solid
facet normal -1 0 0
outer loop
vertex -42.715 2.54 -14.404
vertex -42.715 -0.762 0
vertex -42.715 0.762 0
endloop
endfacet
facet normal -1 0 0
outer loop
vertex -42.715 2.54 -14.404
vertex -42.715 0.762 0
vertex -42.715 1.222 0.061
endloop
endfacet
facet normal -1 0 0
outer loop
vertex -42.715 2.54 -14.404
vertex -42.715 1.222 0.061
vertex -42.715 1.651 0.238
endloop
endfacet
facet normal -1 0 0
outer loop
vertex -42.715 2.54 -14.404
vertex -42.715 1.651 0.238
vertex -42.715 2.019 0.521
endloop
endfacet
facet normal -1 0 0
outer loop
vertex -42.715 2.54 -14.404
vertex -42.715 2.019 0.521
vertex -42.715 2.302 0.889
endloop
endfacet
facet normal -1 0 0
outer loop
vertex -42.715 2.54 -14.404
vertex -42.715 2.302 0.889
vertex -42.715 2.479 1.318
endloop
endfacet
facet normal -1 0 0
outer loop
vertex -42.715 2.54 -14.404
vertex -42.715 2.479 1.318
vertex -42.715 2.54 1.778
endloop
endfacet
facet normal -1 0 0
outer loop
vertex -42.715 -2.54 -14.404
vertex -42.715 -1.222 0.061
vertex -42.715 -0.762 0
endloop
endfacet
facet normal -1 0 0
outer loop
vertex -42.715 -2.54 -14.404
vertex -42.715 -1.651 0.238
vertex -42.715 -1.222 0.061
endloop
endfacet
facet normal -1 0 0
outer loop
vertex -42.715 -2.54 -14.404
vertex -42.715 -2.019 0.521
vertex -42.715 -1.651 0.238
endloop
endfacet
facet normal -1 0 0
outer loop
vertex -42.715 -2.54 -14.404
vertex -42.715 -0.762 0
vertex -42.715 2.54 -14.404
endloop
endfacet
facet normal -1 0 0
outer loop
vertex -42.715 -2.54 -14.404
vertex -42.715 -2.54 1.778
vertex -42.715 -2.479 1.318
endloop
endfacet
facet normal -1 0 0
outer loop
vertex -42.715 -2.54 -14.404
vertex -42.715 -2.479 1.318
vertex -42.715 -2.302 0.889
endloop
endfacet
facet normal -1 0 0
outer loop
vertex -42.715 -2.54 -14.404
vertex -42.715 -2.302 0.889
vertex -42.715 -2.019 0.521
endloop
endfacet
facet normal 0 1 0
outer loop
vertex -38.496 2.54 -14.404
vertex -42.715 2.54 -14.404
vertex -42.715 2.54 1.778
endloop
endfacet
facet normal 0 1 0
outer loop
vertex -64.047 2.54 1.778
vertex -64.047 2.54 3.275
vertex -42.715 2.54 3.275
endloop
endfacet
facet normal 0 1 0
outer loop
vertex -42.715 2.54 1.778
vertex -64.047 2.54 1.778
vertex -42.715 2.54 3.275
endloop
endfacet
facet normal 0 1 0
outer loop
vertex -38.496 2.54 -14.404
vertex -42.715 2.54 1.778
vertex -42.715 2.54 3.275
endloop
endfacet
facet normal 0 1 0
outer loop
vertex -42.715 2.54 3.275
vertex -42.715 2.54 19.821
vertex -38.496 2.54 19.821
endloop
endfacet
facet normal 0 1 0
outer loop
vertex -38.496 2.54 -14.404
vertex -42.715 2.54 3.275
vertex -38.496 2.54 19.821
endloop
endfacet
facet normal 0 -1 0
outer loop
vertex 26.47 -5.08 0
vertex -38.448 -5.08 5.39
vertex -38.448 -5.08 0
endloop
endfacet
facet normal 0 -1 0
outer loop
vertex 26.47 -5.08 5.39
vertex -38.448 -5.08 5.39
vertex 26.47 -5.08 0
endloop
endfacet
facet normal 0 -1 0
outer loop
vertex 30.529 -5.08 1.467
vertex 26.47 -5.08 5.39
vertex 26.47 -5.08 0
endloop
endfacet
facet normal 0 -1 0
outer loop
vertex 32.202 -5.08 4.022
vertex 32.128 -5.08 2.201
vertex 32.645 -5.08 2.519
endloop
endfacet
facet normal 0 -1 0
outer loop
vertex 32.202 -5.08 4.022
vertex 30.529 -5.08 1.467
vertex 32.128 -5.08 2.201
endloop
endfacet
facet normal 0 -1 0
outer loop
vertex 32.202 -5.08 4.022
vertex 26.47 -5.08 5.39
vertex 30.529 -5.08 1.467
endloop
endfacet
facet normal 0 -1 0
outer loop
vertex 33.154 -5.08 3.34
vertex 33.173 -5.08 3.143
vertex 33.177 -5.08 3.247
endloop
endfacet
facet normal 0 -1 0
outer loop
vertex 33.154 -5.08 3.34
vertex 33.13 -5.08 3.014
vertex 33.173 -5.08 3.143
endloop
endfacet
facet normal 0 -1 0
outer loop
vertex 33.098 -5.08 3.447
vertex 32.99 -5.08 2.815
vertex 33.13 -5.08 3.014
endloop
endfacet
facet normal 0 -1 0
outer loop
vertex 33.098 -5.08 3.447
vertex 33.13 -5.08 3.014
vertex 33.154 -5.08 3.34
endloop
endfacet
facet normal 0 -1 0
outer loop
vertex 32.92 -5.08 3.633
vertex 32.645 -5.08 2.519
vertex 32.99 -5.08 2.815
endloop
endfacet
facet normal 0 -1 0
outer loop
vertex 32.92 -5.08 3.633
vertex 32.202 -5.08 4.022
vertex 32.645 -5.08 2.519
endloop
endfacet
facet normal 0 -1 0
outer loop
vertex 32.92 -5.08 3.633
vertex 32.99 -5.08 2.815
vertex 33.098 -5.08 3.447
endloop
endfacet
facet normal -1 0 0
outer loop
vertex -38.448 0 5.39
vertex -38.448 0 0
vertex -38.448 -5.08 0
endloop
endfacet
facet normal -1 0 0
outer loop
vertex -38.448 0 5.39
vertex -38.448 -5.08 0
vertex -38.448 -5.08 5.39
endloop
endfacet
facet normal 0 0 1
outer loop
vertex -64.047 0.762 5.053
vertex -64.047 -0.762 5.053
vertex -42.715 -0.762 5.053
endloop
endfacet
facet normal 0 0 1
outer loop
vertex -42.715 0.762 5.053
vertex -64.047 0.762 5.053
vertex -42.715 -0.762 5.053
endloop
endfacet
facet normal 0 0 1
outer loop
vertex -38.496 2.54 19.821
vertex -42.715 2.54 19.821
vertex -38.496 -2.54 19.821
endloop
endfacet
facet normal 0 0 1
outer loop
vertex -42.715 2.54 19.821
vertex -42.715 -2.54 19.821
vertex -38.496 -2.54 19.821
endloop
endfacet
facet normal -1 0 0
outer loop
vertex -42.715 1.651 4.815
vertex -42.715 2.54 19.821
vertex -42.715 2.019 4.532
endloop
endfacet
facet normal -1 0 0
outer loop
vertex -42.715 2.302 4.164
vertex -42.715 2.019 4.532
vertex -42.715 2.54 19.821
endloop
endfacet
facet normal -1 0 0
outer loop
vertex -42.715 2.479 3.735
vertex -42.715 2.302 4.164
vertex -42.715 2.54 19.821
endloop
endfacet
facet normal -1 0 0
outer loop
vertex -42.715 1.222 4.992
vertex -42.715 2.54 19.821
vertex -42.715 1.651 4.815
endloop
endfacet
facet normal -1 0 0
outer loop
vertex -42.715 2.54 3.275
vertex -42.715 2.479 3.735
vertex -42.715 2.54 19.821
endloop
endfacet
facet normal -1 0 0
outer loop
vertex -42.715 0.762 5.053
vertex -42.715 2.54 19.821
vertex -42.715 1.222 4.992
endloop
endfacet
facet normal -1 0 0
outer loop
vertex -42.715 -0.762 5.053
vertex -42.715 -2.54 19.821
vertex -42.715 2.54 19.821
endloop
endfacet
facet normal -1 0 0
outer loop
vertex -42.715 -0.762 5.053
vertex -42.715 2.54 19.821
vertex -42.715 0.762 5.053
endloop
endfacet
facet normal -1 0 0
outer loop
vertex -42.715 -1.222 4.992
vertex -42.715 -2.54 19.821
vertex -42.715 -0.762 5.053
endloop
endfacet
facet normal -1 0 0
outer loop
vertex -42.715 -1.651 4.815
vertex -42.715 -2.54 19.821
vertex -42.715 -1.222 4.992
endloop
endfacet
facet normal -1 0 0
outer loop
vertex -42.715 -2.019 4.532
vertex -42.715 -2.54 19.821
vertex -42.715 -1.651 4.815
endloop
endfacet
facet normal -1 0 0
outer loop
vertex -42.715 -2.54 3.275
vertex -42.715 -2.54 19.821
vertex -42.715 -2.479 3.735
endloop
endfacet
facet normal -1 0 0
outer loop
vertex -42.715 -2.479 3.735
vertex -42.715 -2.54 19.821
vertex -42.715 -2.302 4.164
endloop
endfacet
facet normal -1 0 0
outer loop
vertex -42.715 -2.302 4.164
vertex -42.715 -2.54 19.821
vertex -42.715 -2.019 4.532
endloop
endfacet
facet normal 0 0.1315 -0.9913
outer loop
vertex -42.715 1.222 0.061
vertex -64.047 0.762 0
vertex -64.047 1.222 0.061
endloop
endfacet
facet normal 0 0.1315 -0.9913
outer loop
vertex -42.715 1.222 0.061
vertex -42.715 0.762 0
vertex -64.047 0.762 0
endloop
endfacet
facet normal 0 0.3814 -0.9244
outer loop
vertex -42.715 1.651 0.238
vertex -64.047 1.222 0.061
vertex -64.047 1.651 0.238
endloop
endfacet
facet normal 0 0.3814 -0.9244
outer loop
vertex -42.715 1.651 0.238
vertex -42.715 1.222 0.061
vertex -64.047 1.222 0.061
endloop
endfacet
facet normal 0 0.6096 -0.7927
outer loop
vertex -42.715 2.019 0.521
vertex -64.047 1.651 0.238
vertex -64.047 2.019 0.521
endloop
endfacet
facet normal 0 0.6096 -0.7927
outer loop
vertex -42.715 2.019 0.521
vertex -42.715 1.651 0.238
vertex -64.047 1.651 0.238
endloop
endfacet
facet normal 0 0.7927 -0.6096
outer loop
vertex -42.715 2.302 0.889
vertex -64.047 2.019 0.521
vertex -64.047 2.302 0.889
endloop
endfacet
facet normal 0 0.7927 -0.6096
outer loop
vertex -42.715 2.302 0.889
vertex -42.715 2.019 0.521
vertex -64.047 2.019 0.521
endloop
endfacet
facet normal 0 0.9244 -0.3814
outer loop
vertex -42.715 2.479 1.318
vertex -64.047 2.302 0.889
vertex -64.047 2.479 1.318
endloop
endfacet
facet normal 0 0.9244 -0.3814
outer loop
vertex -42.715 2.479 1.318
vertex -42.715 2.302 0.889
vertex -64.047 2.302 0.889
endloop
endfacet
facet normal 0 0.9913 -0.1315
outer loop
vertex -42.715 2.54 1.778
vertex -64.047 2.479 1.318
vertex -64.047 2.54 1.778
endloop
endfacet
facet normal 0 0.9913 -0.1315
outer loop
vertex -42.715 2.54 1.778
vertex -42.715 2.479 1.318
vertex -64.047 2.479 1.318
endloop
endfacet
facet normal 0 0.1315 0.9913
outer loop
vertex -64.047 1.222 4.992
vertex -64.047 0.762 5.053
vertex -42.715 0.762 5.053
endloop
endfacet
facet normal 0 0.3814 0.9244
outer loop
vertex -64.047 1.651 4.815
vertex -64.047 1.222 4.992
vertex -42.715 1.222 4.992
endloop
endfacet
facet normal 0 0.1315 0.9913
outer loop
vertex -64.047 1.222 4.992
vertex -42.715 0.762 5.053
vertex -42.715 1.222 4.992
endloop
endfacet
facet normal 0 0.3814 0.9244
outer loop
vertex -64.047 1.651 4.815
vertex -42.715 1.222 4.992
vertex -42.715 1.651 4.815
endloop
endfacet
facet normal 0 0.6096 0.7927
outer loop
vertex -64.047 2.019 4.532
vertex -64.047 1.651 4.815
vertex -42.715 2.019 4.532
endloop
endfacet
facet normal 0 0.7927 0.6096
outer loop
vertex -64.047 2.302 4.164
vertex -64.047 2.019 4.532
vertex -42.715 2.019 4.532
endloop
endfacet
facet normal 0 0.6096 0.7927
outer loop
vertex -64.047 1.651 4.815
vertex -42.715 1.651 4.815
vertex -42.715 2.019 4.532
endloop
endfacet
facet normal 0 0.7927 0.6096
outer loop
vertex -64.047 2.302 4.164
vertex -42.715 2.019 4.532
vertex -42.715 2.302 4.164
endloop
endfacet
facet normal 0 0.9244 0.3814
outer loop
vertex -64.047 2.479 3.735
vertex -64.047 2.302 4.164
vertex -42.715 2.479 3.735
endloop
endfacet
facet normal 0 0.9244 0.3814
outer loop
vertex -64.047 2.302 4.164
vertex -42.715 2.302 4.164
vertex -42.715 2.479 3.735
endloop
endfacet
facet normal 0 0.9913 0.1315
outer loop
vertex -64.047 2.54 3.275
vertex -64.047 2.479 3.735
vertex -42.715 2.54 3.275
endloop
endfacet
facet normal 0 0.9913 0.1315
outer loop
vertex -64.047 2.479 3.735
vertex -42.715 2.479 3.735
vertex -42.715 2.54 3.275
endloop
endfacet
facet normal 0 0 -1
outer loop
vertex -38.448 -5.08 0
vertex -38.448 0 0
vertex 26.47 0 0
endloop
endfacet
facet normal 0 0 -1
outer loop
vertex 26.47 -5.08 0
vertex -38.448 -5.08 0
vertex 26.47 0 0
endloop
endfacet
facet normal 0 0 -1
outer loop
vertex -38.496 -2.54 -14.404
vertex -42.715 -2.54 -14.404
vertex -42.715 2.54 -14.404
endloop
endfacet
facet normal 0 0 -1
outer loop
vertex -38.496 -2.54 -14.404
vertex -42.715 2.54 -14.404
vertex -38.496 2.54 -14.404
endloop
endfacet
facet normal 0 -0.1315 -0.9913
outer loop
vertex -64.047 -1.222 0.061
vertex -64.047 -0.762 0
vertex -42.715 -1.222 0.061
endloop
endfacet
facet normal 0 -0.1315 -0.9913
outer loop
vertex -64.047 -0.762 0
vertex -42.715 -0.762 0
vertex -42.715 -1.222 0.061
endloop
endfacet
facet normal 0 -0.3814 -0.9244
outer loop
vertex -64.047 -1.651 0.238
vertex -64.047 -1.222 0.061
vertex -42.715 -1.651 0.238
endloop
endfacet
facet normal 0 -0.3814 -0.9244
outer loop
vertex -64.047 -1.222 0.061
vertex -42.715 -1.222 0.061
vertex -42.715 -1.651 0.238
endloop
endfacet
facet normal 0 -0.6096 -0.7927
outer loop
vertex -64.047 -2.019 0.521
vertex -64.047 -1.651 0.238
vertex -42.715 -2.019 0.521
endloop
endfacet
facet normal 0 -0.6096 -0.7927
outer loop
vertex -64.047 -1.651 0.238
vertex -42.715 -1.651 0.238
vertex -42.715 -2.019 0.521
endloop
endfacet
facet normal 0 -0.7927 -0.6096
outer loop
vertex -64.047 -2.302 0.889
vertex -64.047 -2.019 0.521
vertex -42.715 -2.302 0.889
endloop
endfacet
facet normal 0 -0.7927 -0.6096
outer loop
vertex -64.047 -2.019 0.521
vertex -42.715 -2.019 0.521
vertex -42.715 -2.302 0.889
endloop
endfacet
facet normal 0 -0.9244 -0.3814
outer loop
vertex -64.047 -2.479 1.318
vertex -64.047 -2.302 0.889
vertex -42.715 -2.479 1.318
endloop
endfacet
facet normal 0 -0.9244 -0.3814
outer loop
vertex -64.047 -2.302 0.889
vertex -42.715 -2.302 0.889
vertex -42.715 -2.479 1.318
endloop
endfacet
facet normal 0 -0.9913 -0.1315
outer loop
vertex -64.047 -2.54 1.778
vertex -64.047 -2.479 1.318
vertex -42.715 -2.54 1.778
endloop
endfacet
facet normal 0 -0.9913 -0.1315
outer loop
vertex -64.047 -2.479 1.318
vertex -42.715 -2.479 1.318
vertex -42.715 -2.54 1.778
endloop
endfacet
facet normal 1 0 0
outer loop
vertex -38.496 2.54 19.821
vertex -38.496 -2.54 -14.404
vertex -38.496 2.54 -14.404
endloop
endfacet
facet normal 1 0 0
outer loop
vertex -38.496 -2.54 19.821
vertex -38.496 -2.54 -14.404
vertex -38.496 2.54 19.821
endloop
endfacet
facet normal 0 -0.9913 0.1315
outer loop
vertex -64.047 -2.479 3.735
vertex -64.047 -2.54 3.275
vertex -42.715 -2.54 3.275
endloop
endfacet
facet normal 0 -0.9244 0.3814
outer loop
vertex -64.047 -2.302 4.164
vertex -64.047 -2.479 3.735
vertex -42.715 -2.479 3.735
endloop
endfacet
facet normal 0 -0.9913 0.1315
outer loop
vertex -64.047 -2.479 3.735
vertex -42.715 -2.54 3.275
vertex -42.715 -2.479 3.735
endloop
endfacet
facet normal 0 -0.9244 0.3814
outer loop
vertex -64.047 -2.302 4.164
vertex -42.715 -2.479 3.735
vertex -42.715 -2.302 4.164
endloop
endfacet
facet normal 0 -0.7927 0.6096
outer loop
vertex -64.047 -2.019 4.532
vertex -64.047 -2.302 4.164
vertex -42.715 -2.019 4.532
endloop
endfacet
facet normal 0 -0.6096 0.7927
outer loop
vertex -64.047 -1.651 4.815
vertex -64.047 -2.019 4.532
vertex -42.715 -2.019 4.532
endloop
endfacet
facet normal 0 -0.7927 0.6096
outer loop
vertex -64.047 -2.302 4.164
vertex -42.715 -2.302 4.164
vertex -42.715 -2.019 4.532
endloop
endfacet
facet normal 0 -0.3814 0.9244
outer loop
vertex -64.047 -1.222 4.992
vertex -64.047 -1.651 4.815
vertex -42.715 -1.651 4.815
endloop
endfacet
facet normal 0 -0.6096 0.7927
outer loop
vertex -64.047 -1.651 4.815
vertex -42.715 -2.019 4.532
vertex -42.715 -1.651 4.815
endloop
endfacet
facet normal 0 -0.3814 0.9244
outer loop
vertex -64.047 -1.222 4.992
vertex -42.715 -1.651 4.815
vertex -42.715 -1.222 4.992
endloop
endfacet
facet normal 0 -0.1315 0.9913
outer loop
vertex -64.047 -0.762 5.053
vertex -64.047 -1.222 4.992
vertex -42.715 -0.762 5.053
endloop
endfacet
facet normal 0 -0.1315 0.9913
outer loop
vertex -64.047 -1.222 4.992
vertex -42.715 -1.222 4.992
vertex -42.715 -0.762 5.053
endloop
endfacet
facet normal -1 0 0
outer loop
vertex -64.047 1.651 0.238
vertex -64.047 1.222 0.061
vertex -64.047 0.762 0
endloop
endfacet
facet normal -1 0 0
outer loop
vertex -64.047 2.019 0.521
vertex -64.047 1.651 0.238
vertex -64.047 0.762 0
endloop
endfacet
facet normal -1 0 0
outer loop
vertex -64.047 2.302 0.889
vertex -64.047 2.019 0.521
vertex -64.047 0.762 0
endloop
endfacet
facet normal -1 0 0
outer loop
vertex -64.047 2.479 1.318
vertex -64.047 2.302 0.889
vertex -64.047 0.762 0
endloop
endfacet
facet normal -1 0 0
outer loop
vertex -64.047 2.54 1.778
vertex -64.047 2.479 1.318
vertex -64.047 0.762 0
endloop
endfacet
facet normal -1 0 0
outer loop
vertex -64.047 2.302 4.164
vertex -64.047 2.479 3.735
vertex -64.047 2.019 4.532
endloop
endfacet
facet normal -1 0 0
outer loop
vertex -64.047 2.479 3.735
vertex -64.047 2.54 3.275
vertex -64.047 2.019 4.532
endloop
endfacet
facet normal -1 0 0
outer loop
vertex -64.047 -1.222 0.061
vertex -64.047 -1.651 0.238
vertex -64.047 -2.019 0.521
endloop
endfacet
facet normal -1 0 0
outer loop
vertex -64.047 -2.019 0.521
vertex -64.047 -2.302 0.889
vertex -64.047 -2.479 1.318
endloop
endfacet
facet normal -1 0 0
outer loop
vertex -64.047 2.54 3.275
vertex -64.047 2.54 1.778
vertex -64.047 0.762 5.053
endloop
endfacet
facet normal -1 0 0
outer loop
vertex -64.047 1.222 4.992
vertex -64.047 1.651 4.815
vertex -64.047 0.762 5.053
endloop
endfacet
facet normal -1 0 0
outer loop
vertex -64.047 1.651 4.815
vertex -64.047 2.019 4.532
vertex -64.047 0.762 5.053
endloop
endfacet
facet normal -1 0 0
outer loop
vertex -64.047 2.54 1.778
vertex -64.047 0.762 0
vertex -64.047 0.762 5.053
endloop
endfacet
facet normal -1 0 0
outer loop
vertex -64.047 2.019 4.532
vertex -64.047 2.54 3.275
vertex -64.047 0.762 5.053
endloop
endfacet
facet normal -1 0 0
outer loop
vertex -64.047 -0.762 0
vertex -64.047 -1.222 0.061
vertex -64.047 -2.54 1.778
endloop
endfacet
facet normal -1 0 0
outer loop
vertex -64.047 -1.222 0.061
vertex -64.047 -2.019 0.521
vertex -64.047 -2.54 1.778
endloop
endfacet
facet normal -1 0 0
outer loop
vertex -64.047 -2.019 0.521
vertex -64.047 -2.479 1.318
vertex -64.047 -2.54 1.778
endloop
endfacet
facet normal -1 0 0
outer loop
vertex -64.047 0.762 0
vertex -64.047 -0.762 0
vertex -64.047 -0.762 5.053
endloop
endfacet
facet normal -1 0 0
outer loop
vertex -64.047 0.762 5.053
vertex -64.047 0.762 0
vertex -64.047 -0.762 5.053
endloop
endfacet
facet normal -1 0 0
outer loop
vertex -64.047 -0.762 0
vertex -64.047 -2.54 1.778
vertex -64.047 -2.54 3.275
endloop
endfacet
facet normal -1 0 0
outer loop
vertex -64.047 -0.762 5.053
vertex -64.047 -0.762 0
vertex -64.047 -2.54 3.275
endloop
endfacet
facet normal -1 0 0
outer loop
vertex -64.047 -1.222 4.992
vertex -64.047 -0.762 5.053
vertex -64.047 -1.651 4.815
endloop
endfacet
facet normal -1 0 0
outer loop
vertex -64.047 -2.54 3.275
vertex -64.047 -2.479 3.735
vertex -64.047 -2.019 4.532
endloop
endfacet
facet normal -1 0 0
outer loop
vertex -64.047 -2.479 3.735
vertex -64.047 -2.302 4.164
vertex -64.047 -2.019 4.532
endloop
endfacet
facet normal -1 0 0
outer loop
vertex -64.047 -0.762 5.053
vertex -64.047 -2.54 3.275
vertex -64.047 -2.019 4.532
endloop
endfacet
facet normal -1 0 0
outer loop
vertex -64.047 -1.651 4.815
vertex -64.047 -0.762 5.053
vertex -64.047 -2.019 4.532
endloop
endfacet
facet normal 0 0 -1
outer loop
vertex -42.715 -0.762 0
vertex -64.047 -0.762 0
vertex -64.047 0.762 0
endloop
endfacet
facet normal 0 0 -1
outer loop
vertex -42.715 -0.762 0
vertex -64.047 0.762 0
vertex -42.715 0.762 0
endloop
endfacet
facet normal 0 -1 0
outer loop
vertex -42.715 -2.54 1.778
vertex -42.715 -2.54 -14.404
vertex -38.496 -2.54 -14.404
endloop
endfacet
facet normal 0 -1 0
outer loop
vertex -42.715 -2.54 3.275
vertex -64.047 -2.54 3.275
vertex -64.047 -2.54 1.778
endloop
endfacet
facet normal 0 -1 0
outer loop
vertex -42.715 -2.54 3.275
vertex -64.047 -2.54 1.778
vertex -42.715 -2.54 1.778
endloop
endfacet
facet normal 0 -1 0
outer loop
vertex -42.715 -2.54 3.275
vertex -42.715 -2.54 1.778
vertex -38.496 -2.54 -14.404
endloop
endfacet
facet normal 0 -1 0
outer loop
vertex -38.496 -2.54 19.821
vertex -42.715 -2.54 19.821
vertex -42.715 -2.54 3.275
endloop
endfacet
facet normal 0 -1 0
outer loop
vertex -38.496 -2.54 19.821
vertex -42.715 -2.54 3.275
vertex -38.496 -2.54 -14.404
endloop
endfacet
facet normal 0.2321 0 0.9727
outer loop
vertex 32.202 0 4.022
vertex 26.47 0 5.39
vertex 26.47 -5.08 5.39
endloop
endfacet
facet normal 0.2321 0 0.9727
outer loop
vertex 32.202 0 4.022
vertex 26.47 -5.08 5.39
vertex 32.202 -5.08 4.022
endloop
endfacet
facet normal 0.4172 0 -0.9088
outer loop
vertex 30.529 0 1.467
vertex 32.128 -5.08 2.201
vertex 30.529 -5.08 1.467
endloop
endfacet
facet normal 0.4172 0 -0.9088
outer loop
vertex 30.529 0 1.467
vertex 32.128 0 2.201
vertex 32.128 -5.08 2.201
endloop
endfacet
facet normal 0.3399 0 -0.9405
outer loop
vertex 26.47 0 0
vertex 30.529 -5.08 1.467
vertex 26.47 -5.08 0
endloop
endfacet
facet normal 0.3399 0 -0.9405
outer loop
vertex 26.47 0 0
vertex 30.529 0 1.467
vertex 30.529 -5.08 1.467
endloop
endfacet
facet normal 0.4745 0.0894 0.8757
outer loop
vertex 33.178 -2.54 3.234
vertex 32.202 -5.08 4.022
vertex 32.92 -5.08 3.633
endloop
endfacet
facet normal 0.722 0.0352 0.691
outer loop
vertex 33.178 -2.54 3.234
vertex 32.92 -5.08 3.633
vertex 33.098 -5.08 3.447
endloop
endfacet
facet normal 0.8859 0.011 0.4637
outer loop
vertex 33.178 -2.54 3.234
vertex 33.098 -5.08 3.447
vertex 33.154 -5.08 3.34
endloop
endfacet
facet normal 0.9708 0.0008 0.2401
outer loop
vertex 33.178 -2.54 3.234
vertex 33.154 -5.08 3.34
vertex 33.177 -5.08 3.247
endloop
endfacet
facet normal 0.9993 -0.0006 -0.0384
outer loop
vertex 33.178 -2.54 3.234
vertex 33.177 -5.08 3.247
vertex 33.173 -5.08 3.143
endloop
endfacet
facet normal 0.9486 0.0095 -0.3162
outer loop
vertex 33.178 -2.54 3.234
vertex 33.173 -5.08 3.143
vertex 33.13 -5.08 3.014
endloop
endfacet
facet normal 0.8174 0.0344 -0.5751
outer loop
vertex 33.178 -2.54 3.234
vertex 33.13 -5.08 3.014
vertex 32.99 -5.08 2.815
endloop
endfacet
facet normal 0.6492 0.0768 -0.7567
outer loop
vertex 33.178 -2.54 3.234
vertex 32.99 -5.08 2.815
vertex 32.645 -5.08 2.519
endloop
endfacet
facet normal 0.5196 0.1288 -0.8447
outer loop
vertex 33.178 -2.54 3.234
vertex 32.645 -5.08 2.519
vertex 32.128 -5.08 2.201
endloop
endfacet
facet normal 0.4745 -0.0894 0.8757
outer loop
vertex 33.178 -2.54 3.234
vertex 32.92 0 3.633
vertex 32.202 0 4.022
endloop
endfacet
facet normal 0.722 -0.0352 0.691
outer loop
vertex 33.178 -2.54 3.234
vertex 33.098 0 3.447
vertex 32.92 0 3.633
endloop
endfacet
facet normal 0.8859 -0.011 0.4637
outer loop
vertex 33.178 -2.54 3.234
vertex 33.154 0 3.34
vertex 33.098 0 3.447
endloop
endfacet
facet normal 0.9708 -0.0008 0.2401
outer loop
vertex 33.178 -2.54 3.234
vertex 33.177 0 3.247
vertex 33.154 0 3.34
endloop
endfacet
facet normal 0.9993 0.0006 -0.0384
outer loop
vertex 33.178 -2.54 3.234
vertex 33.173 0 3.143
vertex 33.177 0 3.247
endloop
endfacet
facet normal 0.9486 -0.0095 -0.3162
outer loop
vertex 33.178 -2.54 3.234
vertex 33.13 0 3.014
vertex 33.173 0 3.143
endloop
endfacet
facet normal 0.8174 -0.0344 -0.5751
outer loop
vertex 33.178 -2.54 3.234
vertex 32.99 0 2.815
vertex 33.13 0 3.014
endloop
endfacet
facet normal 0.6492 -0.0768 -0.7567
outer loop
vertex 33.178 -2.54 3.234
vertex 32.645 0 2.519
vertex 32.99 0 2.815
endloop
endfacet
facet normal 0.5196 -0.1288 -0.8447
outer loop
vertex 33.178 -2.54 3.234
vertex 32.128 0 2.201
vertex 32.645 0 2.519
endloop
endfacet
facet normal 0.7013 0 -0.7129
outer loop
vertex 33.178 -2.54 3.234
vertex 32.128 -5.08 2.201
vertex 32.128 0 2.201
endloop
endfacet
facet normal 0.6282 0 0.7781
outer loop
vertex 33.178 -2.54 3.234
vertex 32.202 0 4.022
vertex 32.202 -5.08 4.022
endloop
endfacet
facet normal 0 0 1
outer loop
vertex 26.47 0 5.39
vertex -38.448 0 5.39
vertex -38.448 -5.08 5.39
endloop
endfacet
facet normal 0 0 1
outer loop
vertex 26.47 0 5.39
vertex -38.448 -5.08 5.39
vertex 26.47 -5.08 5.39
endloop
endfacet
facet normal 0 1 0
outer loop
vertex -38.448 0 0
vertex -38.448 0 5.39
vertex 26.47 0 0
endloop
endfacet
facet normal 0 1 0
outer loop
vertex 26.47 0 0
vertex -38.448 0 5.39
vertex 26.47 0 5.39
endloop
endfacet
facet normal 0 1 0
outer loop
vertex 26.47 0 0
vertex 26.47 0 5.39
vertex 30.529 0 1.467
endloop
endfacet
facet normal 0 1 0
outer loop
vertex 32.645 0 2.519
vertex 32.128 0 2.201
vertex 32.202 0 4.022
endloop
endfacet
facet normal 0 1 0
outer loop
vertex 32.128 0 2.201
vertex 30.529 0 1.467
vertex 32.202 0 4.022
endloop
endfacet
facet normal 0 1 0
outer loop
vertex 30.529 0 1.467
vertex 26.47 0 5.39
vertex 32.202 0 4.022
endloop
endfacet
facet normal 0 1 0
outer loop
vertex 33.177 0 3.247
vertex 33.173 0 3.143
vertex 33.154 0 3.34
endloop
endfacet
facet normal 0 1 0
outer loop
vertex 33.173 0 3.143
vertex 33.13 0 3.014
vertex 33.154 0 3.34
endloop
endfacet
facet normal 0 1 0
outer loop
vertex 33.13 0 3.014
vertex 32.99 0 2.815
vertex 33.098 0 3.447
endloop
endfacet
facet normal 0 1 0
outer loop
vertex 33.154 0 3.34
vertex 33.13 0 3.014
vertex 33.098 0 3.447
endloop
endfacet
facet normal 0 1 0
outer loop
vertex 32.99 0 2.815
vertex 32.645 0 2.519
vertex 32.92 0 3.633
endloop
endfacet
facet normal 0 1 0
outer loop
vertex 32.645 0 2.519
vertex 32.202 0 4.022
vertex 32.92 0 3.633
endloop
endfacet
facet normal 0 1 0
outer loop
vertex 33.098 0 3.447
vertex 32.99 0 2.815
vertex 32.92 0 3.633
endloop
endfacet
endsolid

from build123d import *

# Parameters (mm, degrees)
F0_W     = 4.2195208371
F0_H     = 14.7683215328
F0_H_2   = 14.40386381
F0_H_3   = 5.0528156571
F0_W_2   = 21.3320218027
F1_DEPTH = 2.54
F2_R     = 1.778
F3_W     = 64.9182964116
F3_H     = 5.3898948245
F4_DEPTH = 5.08


with BuildPart() as f1:
    # F0 (on Front) → F1 (new body, symmetric)
    with BuildSketch(Plane.XZ):
        with Locations((-40.605539456, 12.4369764235)):
            Rectangle(F0_W, F0_H)
        with Locations((-40.605539456, -7.201931905)):
            Rectangle(F0_W, F0_H_2)
        with Locations((-40.605539456, 2.5264078286)):
            Rectangle(F0_W, F0_H_3)
        with Locations((-53.3813107759, 2.5264078286)):
            Rectangle(F0_W_2, F0_H_3)
    extrude(amount=F1_DEPTH, both=True)

    # F2
    f2_edges = [f1.edges().sort_by_distance(p)[0] for p in [
        (-53.381311, -2.54, 5.052816),
        (-53.381311, 2.54, 0),
        (-53.381311, 2.54, 5.052816),
        (-53.381311, -2.54, 0),
    ]]
    fillet(f2_edges, radius=F2_R)


with BuildPart() as f4:
    # F3 (on Front) → F4 (new body)
    with BuildSketch(Plane.XZ):
        with Locations((-5.9887720272, 2.6949474122)):
            Rectangle(F3_W, F3_H)
        with BuildLine():
            add(Edge.make_bspline(
                [(26.4703761786, 5.3898948245), (29.7935745055, 4.7525771684), (36.533219355, 3.4600588664), (29.8554545831, 1.1639424705), (26.4703761786, 0)],
                knots=[0, 0, 0, 0, 0.4930821135, 1, 1, 1, 1], degree=3))
            Line((26.4703761786, 5.3898948245), (26.4703761786, 0))
        make_face()
    extrude(amount=F4_DEPTH)


solid = Compound([f1.part, f4.part])
